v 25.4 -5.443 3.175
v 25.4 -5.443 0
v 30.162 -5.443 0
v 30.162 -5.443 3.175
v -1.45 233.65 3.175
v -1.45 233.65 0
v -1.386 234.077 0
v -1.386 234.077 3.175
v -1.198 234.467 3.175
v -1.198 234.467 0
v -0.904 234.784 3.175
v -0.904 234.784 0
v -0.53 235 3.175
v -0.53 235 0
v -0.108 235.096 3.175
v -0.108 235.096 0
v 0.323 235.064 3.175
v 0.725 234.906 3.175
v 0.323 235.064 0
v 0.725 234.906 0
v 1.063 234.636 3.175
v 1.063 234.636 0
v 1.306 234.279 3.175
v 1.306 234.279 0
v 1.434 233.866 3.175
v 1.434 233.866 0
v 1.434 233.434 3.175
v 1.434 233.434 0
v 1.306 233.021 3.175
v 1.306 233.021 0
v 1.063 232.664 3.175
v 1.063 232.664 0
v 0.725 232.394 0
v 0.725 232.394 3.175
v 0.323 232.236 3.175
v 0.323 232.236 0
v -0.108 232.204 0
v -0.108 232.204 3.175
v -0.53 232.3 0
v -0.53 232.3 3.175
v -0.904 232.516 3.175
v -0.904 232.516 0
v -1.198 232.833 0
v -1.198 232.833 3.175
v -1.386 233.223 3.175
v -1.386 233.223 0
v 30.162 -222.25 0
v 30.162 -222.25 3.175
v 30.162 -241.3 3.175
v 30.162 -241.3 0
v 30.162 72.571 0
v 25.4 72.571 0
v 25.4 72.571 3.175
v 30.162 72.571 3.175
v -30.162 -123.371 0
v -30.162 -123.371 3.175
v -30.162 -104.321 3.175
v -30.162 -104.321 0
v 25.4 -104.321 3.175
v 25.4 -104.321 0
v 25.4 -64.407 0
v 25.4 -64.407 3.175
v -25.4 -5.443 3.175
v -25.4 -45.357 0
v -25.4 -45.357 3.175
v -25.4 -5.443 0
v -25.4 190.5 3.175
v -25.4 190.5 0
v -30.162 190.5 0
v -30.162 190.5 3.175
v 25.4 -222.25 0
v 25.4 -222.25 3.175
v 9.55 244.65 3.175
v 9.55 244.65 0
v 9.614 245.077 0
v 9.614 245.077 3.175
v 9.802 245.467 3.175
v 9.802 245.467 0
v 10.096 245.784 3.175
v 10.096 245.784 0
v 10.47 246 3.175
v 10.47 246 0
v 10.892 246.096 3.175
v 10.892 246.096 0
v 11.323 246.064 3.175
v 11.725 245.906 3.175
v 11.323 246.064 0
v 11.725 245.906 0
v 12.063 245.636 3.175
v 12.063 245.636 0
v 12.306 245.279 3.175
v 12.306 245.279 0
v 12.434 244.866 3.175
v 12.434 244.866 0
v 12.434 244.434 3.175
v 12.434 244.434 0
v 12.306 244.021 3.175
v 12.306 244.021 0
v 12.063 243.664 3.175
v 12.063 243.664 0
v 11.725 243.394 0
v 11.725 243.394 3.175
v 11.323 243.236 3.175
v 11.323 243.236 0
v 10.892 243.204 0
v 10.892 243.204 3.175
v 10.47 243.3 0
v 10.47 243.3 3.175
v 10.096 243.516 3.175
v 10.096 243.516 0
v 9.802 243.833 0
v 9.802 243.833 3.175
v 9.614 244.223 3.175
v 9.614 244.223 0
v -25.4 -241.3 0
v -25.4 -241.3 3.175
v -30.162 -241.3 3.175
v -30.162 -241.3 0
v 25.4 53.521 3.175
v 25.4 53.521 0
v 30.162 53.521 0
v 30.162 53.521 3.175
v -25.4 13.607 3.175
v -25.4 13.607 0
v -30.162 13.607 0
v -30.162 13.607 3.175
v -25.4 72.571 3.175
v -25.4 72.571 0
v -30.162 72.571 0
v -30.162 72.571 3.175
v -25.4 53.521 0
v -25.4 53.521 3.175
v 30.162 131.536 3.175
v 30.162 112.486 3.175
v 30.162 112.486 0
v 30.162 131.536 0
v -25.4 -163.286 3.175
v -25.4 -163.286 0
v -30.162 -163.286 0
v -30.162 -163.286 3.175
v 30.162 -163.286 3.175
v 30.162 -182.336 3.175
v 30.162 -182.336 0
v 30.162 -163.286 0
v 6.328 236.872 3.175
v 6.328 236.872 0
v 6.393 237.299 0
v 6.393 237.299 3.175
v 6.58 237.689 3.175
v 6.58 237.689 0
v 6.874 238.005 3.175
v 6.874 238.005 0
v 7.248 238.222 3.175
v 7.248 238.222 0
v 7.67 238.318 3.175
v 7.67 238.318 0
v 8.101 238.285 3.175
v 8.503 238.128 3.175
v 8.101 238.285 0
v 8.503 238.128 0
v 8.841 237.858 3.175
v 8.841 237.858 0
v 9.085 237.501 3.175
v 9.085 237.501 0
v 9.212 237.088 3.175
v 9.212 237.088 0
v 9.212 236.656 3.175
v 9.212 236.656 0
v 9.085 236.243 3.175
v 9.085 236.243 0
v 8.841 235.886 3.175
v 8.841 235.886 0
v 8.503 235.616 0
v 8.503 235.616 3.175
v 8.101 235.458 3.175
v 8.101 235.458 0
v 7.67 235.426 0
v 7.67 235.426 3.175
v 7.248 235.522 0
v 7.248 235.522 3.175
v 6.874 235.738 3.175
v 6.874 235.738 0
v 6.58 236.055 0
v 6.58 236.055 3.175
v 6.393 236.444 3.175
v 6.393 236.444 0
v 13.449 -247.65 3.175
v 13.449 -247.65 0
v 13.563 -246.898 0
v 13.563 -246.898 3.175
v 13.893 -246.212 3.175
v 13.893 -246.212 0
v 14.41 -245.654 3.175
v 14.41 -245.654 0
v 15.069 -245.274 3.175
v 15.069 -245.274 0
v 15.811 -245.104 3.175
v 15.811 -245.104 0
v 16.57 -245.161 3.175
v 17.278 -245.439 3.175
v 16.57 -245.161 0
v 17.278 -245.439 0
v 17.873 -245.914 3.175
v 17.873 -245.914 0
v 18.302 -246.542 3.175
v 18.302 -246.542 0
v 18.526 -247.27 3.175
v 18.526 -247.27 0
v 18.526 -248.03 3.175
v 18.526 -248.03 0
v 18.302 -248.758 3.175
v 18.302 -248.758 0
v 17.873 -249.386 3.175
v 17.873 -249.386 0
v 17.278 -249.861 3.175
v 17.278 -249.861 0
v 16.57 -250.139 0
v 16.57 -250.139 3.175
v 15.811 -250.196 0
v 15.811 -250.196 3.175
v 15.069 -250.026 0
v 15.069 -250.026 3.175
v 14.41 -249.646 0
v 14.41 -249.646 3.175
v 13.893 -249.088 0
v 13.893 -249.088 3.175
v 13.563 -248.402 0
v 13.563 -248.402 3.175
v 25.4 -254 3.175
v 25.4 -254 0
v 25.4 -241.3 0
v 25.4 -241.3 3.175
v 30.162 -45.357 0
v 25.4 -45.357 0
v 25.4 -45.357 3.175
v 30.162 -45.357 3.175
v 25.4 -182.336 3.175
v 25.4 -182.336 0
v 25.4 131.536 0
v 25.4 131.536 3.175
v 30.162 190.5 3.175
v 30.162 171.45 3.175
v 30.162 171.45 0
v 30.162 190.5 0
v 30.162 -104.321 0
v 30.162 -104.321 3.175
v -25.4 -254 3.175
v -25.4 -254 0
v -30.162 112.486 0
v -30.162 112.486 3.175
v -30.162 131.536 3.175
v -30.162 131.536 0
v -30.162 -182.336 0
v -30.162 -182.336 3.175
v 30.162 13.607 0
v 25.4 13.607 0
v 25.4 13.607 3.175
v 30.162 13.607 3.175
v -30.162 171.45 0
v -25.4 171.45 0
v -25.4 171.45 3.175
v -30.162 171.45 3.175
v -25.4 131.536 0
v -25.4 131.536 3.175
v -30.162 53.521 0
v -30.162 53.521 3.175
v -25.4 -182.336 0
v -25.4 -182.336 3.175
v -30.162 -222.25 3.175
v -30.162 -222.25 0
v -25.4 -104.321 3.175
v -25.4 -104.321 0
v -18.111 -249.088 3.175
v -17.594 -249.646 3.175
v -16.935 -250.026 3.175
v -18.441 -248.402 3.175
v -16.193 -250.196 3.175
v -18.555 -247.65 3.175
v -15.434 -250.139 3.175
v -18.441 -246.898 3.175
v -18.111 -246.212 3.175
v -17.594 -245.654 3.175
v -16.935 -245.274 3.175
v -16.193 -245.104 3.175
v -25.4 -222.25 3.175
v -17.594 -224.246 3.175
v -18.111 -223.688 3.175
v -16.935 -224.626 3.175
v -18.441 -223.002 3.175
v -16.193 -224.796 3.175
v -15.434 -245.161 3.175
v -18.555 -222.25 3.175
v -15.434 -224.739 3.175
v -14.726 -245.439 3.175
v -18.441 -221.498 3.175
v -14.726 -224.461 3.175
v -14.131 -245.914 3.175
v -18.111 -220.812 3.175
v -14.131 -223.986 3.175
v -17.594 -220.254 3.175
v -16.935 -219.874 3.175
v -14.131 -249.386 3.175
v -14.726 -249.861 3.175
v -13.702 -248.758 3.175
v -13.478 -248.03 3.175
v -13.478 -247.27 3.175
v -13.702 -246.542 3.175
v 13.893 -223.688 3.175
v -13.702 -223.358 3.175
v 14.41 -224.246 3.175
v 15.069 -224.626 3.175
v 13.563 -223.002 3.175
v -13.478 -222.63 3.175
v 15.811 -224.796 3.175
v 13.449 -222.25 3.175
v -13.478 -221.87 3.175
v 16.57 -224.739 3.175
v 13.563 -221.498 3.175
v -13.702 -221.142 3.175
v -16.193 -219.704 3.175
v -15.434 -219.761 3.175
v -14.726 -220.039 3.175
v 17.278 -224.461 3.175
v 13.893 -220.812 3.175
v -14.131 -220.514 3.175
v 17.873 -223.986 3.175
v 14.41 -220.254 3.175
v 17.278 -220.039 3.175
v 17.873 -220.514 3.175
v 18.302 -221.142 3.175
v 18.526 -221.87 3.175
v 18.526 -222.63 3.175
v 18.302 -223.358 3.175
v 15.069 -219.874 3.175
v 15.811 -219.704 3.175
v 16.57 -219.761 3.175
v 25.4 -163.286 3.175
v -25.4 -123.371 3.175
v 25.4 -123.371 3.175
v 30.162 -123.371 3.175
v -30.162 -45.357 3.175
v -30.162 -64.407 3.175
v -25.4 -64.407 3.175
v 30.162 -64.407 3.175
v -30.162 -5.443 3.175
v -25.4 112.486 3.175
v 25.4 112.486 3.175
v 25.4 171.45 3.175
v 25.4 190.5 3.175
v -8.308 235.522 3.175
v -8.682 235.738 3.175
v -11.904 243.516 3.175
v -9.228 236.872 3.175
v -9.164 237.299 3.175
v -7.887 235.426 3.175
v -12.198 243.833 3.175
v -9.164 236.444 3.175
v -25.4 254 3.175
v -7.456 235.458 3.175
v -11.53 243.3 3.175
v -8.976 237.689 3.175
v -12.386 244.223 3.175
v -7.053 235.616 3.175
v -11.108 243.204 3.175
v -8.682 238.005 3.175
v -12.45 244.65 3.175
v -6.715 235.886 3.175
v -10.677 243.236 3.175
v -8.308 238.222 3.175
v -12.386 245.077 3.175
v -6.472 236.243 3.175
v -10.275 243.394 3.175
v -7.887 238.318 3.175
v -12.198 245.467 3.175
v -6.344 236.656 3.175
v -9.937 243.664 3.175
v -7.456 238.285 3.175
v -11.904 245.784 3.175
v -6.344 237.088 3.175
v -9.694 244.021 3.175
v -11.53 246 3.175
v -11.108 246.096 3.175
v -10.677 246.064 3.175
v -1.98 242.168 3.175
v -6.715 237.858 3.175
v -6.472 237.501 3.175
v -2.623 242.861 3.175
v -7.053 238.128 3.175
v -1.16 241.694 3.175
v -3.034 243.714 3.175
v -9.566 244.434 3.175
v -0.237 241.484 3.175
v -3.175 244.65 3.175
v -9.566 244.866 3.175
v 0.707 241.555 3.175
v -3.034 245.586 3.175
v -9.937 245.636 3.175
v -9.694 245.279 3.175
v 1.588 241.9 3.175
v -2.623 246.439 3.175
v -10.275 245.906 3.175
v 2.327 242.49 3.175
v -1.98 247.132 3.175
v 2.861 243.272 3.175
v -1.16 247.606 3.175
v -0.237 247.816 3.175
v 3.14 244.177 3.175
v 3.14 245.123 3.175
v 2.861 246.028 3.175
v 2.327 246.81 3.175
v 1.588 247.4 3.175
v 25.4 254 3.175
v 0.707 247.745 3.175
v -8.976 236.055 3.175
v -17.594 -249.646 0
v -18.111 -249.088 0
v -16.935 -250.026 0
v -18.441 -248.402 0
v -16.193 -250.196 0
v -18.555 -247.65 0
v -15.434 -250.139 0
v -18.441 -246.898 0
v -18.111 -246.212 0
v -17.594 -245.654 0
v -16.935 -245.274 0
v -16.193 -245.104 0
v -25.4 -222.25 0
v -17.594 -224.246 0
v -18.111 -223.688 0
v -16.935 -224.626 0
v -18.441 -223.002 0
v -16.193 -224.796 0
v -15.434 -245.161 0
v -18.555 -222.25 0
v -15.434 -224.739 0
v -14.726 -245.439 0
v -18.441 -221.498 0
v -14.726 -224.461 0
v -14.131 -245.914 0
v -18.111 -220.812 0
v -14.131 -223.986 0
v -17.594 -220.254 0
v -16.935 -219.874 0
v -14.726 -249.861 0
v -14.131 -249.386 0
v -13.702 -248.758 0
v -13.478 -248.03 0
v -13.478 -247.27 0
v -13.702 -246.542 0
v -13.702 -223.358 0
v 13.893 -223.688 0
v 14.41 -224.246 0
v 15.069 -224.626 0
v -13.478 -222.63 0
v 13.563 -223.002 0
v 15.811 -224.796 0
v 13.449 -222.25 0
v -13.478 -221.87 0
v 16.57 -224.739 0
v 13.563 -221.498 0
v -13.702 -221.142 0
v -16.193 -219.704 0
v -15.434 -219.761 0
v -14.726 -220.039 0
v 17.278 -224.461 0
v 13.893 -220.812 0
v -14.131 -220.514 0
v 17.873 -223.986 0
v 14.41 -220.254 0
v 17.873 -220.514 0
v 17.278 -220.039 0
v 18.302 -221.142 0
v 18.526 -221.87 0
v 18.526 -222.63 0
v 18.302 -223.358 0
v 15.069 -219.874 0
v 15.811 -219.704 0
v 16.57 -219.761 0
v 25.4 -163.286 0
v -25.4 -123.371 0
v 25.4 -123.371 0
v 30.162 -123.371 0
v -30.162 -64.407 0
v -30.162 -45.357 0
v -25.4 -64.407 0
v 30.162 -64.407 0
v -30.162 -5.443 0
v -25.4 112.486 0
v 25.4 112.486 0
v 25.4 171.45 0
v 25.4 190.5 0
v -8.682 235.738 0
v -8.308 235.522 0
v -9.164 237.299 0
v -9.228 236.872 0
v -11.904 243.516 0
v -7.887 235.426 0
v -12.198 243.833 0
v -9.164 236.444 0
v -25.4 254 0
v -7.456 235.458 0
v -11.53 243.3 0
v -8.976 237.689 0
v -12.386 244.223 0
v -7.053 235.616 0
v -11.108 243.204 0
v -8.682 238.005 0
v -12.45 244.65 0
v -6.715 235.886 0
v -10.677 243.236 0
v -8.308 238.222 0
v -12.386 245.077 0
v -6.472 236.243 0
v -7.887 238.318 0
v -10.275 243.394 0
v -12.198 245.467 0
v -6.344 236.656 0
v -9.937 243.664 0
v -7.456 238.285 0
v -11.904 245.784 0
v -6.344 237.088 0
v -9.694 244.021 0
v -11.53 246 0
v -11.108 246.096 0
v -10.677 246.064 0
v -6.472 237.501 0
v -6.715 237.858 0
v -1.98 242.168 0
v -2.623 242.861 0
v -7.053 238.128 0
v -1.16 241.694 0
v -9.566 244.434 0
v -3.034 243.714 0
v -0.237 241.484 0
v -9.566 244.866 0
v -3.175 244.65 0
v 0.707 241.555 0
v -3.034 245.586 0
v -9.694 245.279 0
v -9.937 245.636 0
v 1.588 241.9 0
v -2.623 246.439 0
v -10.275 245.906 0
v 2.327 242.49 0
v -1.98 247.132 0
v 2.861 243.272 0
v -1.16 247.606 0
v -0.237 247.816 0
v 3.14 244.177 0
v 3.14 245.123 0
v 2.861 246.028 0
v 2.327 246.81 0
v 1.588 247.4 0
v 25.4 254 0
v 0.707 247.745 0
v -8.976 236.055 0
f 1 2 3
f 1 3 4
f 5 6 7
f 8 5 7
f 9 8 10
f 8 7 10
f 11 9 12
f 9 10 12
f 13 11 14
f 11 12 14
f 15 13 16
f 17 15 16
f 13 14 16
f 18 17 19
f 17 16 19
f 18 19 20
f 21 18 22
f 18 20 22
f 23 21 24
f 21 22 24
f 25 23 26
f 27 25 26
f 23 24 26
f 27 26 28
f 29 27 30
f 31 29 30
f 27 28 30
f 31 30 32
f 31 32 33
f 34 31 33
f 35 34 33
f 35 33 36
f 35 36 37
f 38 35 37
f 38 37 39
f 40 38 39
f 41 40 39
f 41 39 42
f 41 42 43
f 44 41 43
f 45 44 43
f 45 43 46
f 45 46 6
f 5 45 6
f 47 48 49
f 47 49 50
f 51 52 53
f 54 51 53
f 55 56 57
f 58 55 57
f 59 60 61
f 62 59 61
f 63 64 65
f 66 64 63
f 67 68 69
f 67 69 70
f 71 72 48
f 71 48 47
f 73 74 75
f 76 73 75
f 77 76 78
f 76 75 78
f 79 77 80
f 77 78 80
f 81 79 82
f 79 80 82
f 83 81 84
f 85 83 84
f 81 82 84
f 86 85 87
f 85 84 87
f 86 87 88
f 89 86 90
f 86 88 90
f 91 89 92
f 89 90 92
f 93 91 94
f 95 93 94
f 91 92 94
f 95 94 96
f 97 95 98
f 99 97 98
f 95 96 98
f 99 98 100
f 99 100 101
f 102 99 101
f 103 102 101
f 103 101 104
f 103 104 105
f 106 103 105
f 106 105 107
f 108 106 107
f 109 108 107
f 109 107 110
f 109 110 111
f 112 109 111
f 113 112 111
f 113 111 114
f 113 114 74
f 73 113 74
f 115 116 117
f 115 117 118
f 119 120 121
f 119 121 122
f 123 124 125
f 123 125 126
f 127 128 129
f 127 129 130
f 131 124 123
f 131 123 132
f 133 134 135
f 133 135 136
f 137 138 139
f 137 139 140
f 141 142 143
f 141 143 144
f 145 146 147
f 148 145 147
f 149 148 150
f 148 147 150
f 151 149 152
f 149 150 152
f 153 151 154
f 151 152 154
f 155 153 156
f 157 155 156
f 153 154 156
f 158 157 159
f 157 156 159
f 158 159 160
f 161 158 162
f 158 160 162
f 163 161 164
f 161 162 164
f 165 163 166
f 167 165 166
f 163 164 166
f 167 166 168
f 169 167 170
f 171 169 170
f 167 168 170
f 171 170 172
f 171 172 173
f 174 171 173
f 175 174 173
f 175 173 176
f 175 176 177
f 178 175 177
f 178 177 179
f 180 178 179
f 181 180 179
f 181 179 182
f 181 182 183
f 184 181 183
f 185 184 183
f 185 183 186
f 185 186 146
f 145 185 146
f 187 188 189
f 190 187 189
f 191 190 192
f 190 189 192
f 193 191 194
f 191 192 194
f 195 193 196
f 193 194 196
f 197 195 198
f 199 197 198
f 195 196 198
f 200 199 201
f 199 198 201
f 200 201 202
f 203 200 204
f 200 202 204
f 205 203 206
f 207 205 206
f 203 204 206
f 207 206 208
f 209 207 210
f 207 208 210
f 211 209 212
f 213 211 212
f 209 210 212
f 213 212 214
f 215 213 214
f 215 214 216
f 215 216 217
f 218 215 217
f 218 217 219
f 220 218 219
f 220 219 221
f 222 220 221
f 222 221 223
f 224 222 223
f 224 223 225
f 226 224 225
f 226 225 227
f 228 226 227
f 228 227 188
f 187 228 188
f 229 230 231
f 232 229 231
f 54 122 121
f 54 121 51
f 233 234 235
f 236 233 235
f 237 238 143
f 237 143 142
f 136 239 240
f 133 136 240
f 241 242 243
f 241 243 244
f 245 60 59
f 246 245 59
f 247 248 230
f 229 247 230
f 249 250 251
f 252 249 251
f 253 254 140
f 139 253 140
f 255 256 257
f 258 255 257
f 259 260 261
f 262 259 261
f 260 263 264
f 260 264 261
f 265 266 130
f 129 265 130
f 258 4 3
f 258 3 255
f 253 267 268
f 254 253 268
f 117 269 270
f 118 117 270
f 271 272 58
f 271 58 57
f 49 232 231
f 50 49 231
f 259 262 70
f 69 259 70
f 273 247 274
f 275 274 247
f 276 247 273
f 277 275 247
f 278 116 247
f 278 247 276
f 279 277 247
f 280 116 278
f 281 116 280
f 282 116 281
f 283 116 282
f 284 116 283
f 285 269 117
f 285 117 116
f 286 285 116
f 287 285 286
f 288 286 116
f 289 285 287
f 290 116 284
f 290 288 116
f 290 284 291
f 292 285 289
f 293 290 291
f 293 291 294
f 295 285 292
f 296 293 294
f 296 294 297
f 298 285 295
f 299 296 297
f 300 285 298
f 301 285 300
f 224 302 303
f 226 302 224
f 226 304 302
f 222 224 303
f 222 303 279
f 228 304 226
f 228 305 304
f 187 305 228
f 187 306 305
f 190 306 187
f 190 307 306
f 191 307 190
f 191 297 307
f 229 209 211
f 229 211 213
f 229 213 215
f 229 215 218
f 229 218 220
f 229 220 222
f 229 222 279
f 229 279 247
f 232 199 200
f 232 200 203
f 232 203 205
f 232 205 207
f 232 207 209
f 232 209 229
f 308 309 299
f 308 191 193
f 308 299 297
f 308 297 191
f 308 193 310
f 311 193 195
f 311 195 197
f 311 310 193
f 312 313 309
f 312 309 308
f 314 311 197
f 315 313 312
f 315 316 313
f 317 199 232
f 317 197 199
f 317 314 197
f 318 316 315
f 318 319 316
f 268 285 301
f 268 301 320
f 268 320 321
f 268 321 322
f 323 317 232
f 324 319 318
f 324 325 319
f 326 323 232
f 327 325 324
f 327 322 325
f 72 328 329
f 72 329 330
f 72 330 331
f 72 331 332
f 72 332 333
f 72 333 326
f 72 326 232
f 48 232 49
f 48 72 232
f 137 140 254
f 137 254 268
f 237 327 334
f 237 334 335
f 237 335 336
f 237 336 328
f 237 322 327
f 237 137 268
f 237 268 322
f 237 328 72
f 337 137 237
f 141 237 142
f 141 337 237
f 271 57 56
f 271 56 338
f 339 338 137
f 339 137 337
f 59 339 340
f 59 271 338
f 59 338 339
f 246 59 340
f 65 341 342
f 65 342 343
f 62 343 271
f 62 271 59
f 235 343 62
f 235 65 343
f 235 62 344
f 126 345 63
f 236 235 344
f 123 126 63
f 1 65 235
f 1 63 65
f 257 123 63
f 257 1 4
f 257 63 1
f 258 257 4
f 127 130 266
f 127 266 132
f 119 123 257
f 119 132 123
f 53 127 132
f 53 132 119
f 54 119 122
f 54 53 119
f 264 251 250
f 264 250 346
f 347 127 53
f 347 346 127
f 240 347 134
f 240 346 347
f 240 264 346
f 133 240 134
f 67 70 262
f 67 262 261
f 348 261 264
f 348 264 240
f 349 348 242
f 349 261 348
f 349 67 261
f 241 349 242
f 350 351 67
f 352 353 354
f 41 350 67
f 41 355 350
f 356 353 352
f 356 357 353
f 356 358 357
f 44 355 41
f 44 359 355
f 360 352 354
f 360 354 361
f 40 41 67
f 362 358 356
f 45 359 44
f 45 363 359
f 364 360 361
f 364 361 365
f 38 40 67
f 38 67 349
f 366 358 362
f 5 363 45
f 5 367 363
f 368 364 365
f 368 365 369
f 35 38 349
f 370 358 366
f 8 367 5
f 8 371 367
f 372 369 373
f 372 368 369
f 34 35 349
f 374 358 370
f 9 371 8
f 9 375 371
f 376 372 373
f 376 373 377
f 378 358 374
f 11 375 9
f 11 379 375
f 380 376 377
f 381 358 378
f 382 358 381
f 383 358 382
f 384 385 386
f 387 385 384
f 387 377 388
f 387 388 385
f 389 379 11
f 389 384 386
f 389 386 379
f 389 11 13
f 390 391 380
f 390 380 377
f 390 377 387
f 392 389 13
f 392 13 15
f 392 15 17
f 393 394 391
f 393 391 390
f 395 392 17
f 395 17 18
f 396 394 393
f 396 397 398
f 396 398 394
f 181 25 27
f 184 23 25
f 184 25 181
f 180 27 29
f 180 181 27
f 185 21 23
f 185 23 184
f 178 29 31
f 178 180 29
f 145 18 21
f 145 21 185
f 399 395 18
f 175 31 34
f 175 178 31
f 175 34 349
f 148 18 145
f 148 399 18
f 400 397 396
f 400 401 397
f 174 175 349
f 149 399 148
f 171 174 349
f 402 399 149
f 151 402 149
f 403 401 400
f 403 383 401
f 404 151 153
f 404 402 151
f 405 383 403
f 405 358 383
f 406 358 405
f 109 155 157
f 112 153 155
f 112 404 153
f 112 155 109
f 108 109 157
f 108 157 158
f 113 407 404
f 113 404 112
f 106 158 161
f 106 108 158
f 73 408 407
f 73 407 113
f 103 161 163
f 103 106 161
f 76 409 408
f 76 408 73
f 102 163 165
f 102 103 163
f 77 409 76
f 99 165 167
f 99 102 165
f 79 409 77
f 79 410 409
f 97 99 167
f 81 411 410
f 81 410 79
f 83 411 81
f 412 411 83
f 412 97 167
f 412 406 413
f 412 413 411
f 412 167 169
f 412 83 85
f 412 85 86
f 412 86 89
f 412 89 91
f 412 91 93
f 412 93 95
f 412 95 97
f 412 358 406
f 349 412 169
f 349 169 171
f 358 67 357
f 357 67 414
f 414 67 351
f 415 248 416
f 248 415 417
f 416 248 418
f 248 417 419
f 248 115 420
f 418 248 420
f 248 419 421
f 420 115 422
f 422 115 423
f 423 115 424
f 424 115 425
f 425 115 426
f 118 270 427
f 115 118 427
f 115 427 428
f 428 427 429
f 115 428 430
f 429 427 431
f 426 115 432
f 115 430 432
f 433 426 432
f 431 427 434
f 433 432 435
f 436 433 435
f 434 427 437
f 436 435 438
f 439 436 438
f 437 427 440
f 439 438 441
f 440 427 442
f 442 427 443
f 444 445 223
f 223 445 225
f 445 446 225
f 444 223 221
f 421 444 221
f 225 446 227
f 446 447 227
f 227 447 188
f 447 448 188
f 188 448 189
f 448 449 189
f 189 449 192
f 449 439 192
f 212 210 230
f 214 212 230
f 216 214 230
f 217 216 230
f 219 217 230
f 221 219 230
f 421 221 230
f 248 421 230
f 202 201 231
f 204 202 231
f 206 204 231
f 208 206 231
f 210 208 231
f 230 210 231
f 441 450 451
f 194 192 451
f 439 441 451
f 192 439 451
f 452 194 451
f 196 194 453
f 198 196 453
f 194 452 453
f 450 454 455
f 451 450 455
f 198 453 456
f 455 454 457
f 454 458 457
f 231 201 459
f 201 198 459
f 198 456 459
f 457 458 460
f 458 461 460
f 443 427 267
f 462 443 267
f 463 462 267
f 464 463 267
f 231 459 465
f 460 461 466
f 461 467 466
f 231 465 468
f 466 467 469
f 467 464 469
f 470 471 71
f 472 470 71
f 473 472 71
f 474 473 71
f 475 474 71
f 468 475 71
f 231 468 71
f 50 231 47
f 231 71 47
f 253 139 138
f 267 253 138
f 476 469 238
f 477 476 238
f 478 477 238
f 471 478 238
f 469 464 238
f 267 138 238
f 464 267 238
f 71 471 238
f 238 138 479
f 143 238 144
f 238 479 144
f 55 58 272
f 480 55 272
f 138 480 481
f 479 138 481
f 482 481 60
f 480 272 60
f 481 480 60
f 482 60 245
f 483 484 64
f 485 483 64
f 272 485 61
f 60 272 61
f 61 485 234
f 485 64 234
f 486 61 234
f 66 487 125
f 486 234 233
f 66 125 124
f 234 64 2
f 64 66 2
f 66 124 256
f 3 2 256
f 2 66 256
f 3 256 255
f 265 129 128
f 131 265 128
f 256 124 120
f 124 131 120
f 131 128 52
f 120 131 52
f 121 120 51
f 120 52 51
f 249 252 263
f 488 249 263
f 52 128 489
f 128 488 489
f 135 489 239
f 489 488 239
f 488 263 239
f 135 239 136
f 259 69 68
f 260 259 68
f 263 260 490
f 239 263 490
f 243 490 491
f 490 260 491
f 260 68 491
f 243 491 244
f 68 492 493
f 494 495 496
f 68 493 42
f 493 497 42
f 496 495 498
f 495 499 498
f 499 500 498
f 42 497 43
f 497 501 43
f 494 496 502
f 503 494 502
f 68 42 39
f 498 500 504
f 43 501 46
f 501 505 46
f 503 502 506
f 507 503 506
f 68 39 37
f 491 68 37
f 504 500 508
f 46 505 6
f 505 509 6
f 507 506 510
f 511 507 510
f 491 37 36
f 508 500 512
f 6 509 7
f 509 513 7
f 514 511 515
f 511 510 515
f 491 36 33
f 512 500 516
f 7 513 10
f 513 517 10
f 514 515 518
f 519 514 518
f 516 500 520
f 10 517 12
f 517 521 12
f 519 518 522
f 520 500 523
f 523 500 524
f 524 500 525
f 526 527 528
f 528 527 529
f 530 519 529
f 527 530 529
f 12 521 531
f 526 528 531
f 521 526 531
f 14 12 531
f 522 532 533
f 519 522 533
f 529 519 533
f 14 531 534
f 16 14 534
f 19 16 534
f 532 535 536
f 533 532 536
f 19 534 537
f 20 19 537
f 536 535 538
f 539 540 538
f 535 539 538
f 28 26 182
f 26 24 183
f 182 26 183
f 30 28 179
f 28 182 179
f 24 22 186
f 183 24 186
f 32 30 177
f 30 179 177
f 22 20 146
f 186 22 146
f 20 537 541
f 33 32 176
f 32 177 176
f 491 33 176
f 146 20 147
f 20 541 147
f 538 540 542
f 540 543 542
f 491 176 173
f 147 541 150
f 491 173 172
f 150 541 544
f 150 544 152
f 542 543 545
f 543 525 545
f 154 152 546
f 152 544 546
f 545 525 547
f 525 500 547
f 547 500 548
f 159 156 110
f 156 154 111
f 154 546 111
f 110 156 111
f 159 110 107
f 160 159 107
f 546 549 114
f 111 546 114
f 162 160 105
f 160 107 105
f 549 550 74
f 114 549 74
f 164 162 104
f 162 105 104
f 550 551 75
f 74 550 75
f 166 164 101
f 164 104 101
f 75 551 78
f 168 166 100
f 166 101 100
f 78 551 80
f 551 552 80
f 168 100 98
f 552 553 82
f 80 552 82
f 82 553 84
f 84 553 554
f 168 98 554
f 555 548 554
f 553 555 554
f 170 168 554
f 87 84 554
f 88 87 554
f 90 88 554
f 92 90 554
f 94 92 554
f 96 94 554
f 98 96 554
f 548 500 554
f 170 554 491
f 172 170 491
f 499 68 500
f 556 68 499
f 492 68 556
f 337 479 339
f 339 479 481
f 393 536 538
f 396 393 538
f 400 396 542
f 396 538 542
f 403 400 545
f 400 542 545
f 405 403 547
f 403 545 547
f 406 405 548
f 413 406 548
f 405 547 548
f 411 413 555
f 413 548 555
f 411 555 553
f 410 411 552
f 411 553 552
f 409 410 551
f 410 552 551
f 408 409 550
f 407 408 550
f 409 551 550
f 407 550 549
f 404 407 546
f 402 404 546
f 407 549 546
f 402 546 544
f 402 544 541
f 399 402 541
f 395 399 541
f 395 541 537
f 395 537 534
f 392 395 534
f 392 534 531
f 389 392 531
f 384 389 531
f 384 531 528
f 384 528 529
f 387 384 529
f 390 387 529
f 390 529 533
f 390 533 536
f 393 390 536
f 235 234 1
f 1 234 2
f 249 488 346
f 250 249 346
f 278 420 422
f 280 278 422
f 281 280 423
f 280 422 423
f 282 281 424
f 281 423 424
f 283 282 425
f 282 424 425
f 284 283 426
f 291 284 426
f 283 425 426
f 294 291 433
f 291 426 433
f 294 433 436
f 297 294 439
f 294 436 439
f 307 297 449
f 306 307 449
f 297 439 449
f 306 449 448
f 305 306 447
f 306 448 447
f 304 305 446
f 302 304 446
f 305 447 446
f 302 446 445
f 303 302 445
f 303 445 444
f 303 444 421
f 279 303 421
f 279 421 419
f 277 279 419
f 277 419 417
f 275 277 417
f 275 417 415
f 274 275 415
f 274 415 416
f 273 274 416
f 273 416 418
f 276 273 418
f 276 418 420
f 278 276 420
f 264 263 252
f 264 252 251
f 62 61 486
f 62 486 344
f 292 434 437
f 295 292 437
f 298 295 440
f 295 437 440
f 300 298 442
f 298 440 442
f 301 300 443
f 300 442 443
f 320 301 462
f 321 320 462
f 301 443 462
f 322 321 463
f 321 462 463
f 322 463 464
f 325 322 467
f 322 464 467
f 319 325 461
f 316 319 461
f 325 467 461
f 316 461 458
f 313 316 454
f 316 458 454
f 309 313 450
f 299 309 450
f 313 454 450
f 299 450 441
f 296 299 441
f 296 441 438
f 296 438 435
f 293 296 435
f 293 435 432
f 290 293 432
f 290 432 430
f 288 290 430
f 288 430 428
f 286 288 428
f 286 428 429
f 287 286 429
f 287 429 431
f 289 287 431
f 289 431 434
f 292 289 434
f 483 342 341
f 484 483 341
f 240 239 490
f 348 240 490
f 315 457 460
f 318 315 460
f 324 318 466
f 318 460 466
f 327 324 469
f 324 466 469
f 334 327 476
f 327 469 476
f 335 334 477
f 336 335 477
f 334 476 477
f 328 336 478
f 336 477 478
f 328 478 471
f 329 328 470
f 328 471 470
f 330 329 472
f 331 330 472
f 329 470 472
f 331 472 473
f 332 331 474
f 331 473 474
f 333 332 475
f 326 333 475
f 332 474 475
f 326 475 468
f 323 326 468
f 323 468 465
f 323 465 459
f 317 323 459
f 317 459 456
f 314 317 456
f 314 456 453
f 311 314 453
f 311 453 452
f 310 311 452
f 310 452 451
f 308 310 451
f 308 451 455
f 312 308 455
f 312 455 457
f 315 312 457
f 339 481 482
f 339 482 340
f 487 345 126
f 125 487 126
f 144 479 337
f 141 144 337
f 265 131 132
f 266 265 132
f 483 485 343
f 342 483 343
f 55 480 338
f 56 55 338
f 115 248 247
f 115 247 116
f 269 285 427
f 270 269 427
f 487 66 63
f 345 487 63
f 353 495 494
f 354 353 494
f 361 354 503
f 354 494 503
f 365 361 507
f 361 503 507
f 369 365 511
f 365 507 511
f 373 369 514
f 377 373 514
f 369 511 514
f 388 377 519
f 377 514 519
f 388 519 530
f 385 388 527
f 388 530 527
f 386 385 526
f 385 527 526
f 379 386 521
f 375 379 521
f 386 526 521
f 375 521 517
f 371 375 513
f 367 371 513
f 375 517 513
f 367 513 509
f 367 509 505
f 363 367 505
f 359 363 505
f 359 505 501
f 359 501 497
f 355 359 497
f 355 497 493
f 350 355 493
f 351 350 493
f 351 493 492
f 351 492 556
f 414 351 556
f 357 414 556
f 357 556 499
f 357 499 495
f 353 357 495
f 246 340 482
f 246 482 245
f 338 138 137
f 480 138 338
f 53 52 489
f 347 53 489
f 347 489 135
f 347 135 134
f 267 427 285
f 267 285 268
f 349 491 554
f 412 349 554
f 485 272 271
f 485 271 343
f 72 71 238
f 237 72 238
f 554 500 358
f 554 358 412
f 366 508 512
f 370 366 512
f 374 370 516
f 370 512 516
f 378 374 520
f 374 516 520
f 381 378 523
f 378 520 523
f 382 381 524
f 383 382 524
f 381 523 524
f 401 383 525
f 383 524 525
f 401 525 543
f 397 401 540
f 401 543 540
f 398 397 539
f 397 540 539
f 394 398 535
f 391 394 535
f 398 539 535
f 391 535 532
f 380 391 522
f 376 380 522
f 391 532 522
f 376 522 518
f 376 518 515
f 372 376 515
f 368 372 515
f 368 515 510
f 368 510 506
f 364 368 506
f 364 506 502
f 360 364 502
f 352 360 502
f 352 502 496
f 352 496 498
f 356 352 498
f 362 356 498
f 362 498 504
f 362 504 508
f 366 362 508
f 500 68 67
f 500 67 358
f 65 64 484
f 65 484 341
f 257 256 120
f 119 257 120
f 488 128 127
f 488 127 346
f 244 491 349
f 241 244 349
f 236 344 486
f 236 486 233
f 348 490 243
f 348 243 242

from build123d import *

# Parameters (mm, degrees)
SKETCH1_W                   = 50.8
SKETCH1_H                   = 508
BOSS_EXTRUDE1_DEPTH         = 3.175
M2_5_CLEARANCE_HOLE1_D      = 2.9
F_1_4_0_25_DIAMETER_HOLE1_D = 6.35
SKETCH6_W                   = 3.175
SKETCH6_H                   = 19.05
BOSS_EXTRUDE2_DEPTH         = 4.7625
CRVPATTERN1_START           = 25.4
CRVPATTERN1_OUTLINE_W       = 19.05
CRVPATTERN1_OUTLINE_H       = 3.175
CRVPATTERN1_DEPTH           = 4.7625
F_10_CLEARANCE_HOLE1_D      = 5.1054


# Read off the part's stored shape, not the designer's step: CrvPattern1
with BuildPart() as part:
    # Sketch1 → Boss-Extrude1 (new body)
    with BuildSketch(Plane.XY):
        Rectangle(SKETCH1_W, SKETCH1_H)
    extrude(amount=BOSS_EXTRUDE1_DEPTH)

    # M2.5 Clearance Hole1 (through all)
    with Locations(Plane.XY.offset(3.175)):
        with Locations((-11, 244.65), (-7.778174593, 236.871825407), (0, 233.65), (7.778174593, 236.871825407), (11, 244.65)):
            Hole(M2_5_CLEARANCE_HOLE1_D / 2)

    # 1/4 (0.25) Diameter Hole1 (through all)
    with Locations(Plane.XY.offset(3.175)):
        with Locations((0, 244.65)):
            Hole(F_1_4_0_25_DIAMETER_HOLE1_D / 2)

    # Sketch6 → Boss-Extrude2 (add)
    with BuildSketch(Plane(origin=(25.4, 0, 0), x_dir=(0, 0, -1), z_dir=(1, 0, 0))):
        with Locations((-1.5875, -231.775)):
            Rectangle(SKETCH6_W, SKETCH6_H)
    boss_extrude2 = extrude(amount=BOSS_EXTRUDE2_DEPTH)

    # CrvPattern1 outline → CrvPattern1 (add)
    with BuildSketch(Plane.YZ.offset(CRVPATTERN1_START)):
        with Locations((-172.810714286, 1.5875)):
            Rectangle(CRVPATTERN1_OUTLINE_W, CRVPATTERN1_OUTLINE_H)
        with Locations((-113.846428571, 1.5875)):
            Rectangle(CRVPATTERN1_OUTLINE_W, CRVPATTERN1_OUTLINE_H)
        with Locations((-54.882142857, 1.5875)):
            Rectangle(CRVPATTERN1_OUTLINE_W, CRVPATTERN1_OUTLINE_H)
        with Locations((4.082142857, 1.5875)):
            Rectangle(CRVPATTERN1_OUTLINE_W, CRVPATTERN1_OUTLINE_H)
        with Locations((63.046428571, 1.5875)):
            Rectangle(CRVPATTERN1_OUTLINE_W, CRVPATTERN1_OUTLINE_H)
        with Locations((122.010714286, 1.5875)):
            Rectangle(CRVPATTERN1_OUTLINE_W, CRVPATTERN1_OUTLINE_H)
        with Locations((180.975, 1.5875)):
            Rectangle(CRVPATTERN1_OUTLINE_W, CRVPATTERN1_OUTLINE_H)
    crvpattern1 = extrude(amount=CRVPATTERN1_DEPTH)

    # Mirror1: Boss-Extrude2, CrvPattern1 across plane
    add(boss_extrude2.mirror(Plane.ZY))
    add(crvpattern1.mirror(Plane.ZY))

    # #10 Clearance Hole1 (through all)
    with Locations(Plane.XY.offset(3.175)):
        with Locations((16.002, -247.65), (-16.002, -247.65), (16.002, -222.25), (-16.002, -222.25)):
            Hole(F_10_CLEARANCE_HOLE1_D / 2)


solid = part.part
